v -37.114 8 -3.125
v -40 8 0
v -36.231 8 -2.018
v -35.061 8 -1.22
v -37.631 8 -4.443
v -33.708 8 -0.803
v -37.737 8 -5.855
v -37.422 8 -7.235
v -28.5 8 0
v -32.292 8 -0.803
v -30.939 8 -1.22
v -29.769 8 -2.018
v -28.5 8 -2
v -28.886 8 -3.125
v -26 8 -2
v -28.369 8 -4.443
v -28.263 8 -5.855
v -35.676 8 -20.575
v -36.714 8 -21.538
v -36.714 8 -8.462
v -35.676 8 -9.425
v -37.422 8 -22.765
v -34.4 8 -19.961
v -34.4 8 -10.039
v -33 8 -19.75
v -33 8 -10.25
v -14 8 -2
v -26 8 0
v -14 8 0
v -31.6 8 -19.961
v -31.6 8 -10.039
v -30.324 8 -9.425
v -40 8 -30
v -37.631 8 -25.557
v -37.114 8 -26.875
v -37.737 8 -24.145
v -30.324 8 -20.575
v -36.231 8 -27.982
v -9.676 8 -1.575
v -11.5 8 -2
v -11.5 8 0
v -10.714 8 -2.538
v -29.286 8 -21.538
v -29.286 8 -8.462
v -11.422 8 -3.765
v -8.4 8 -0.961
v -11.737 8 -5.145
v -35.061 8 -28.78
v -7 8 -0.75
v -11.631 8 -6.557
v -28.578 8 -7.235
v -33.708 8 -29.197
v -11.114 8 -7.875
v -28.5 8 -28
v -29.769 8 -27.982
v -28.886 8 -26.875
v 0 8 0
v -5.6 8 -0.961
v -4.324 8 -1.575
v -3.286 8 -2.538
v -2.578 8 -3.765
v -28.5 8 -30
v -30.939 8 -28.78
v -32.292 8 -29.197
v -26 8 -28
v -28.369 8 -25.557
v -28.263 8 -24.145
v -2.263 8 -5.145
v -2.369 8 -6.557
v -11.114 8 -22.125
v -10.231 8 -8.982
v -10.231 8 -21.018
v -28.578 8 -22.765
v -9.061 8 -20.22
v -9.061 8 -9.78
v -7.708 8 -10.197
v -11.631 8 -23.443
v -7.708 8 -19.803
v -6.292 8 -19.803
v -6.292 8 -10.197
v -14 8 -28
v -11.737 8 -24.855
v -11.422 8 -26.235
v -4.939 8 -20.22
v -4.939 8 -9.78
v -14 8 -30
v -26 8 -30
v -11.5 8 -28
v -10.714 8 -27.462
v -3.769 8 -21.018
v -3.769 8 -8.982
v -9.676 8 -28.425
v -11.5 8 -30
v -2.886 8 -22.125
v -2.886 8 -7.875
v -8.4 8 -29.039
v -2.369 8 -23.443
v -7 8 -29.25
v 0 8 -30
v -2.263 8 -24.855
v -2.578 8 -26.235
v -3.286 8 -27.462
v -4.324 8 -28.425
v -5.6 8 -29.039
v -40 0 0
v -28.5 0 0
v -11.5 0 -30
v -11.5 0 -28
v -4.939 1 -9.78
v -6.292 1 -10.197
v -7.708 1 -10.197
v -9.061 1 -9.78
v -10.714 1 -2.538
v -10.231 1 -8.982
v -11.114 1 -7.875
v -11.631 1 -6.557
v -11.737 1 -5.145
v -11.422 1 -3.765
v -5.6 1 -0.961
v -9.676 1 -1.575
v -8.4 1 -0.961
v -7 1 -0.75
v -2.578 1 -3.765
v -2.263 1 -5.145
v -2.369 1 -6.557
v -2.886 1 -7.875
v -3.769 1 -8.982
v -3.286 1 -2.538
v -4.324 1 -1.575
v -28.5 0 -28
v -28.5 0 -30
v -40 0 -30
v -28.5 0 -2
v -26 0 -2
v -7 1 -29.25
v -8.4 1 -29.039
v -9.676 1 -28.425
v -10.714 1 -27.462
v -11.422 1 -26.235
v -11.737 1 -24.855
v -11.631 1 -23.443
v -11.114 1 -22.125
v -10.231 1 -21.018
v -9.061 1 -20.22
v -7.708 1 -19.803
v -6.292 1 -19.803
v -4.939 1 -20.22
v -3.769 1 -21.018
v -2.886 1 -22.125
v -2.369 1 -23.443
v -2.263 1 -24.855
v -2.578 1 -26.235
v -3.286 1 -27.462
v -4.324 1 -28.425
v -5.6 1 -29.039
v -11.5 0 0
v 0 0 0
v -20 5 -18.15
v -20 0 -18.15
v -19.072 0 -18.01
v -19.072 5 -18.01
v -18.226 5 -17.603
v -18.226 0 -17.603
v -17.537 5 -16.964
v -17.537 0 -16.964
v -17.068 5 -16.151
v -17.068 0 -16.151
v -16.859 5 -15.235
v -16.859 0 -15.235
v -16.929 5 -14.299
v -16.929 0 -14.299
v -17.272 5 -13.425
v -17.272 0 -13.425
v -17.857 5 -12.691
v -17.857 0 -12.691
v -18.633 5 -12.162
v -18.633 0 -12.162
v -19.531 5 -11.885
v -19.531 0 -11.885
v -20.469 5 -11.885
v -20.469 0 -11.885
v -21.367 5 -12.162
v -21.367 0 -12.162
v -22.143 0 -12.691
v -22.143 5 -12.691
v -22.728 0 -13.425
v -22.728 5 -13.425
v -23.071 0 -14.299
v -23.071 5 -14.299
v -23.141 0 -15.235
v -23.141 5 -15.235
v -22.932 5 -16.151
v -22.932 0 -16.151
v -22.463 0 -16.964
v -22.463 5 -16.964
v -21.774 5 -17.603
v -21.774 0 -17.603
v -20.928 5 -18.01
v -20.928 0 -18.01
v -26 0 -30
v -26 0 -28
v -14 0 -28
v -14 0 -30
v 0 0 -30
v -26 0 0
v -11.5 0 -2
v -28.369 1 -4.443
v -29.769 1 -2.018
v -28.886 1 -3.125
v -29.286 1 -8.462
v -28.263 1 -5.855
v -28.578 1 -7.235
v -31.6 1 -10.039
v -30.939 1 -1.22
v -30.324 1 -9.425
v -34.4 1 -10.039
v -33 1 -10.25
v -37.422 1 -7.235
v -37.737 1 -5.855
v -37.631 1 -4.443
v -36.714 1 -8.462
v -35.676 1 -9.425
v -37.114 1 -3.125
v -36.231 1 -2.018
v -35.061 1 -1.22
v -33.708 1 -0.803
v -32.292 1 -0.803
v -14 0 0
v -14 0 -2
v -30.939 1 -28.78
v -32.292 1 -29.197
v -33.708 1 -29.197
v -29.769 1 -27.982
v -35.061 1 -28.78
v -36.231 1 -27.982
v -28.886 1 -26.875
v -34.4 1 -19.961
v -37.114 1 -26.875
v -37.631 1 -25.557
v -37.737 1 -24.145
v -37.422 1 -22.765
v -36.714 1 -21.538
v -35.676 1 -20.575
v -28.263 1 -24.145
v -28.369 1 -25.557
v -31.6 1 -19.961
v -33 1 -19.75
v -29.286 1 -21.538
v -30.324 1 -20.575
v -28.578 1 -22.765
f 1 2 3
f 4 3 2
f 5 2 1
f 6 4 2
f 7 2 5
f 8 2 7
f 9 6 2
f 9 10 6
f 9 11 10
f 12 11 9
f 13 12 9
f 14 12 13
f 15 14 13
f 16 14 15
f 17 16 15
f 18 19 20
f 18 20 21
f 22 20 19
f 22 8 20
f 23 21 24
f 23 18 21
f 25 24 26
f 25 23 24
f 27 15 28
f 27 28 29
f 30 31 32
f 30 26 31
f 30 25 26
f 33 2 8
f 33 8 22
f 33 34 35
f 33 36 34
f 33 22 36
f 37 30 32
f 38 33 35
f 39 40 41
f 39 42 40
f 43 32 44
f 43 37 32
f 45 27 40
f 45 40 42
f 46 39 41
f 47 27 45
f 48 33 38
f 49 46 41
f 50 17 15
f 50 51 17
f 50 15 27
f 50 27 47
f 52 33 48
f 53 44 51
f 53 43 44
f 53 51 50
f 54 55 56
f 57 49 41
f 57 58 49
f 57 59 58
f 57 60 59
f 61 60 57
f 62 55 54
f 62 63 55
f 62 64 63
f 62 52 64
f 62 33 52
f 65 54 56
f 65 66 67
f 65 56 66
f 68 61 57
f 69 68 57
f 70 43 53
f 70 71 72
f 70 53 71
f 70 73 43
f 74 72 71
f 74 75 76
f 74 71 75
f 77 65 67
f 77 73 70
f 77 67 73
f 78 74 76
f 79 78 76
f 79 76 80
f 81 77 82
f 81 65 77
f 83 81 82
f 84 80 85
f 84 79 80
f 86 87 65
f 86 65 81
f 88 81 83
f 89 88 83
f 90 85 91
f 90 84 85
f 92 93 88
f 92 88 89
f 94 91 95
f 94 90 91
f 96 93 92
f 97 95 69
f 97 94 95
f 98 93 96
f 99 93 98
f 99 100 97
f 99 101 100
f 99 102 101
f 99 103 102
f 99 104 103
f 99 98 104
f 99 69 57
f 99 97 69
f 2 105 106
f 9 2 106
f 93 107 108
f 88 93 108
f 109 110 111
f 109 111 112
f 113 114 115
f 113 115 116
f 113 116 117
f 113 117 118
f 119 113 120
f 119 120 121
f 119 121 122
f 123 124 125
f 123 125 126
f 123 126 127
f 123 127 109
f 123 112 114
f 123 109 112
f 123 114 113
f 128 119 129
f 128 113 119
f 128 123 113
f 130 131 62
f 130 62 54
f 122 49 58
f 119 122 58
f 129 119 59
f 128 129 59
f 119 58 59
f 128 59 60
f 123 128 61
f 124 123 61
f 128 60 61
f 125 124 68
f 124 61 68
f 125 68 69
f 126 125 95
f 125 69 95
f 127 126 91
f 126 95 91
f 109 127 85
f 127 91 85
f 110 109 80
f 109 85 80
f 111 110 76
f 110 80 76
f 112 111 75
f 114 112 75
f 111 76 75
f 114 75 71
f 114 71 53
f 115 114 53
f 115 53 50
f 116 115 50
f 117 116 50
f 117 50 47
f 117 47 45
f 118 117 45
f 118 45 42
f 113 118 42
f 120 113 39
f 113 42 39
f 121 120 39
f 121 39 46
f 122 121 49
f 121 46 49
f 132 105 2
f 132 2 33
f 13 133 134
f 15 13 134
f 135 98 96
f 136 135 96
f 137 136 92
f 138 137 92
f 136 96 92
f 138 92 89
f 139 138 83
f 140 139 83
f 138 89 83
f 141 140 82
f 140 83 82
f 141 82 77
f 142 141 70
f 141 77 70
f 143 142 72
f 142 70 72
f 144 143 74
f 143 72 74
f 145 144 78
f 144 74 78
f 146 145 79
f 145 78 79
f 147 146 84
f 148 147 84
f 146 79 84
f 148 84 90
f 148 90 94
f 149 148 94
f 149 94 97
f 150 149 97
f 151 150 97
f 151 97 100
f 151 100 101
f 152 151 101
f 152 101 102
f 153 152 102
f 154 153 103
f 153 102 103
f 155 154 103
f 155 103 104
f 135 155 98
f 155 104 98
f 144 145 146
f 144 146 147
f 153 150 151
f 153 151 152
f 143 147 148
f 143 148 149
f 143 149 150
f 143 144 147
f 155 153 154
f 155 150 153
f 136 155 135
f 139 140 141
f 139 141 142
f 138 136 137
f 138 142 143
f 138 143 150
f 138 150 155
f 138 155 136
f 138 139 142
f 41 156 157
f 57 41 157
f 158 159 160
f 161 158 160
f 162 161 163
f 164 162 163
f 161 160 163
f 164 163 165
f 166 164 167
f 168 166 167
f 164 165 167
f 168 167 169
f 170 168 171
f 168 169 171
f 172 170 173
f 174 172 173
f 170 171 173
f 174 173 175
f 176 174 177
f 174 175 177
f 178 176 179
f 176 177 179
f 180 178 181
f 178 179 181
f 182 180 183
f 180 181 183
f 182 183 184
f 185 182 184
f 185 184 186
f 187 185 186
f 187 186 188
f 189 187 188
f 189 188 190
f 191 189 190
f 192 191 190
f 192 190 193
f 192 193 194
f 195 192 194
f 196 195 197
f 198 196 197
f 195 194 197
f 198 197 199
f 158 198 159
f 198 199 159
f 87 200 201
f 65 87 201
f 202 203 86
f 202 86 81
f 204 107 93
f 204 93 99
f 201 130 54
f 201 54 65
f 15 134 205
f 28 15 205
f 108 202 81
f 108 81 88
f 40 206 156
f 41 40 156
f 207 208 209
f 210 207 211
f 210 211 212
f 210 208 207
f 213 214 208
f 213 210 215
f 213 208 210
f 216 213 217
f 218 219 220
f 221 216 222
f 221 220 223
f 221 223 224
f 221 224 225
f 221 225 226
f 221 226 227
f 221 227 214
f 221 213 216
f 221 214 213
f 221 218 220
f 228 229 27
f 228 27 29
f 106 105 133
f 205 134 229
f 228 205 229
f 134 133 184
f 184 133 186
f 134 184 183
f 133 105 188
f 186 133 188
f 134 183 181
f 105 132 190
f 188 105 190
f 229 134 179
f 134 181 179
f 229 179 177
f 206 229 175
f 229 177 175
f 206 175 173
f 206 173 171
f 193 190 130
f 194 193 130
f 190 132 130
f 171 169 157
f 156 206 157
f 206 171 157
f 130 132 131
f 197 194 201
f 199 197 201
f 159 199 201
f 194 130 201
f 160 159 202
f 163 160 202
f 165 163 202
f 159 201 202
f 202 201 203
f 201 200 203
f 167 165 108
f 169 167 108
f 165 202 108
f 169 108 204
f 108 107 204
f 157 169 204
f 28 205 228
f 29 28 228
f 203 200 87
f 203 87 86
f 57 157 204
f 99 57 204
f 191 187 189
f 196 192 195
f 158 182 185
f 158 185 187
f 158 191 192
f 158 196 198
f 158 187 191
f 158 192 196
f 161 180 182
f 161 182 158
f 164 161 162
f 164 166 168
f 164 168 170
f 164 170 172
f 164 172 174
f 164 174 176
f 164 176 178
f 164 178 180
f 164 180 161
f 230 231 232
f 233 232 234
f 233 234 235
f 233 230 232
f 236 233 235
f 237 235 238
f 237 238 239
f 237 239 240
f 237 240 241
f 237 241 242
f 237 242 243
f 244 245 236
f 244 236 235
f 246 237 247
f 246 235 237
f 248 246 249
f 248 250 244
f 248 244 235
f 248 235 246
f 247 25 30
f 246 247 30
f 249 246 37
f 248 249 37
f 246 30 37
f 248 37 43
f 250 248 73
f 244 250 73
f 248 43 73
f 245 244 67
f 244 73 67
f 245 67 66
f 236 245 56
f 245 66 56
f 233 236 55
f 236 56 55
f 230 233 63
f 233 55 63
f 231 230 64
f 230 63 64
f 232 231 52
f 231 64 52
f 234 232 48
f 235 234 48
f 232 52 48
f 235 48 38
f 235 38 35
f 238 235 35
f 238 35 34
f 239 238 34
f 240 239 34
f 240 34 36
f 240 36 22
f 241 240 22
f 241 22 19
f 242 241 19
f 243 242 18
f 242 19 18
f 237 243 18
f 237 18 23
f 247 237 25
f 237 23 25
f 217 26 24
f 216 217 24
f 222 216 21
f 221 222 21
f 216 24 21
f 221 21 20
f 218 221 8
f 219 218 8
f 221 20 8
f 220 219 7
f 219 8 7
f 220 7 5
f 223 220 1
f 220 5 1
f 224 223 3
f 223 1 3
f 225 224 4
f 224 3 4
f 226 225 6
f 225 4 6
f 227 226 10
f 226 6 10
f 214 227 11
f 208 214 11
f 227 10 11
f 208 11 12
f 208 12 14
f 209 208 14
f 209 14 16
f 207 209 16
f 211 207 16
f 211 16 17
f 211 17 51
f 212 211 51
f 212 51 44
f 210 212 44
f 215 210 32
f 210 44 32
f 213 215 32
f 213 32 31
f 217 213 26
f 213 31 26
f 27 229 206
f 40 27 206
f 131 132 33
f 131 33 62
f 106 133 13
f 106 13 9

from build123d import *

# Parameters (mm, degrees)
SKETCH1_W           = 40
SKETCH1_H           = 30
BOSS_EXTRUDE1_DEPTH = 8
SKETCH2_R           = 4.75
CUT_EXTRUDE1_DEPTH  = 7
SKETCH3_R           = 3.15
CUT_EXTRUDE2_DEPTH  = 5
SKETCH4_W           = 2.5
SKETCH4_H           = 2
CUT_EXTRUDE3_DEPTH  = 15


with BuildPart() as part:
    # Sketch1 → Boss-Extrude1 (new body)
    with BuildSketch(Plane(origin=(0, 0, 0), x_dir=(1, 0, 0), z_dir=(0, 1, 0))):
        with Locations((-20, 15)):
            Rectangle(SKETCH1_W, SKETCH1_H)
    extrude(amount=BOSS_EXTRUDE1_DEPTH)

    # Sketch2 → Cut-Extrude1 (cut)
    with BuildSketch(Plane(origin=(0, 8, 0), x_dir=(1, 0, 0), z_dir=(0, 1, 0))):
        with Locations(Location((-33, 24.5, 0), (0, 0, 270))):
            Circle(SKETCH2_R)
        with Locations(Location((-33, 5.5, 0), (0, 0, 90))):
            Circle(SKETCH2_R)
        with Locations(Location((-7, 5.5, 0), (0, 0, 270))):
            Circle(SKETCH2_R)
        with Locations(Location((-7, 24.5, 0), (0, 0, 90))):
            Circle(SKETCH2_R)
    extrude(amount=-CUT_EXTRUDE1_DEPTH, mode=Mode.SUBTRACT)

    # Sketch3 → Cut-Extrude2 (cut)
    with BuildSketch(Plane.XZ):
        with Locations(Location((-20, -15, 0), (0, 0, 270))):
            Circle(SKETCH3_R)
    extrude(amount=-CUT_EXTRUDE2_DEPTH, mode=Mode.SUBTRACT)

    # Sketch4 → Cut-Extrude3 (cut)
    with BuildSketch(Plane.XZ):
        with Locations((-12.75, -1)):
            Rectangle(SKETCH4_W, SKETCH4_H)
        with Locations((-27.25, -1)):
            Rectangle(SKETCH4_W, SKETCH4_H)
        with Locations((-12.75, -29)):
            Rectangle(SKETCH4_W, SKETCH4_H)
        with Locations((-27.25, -29)):
            Rectangle(SKETCH4_W, SKETCH4_H)
    extrude(amount=-CUT_EXTRUDE3_DEPTH, mode=Mode.SUBTRACT)


solid = part.part
